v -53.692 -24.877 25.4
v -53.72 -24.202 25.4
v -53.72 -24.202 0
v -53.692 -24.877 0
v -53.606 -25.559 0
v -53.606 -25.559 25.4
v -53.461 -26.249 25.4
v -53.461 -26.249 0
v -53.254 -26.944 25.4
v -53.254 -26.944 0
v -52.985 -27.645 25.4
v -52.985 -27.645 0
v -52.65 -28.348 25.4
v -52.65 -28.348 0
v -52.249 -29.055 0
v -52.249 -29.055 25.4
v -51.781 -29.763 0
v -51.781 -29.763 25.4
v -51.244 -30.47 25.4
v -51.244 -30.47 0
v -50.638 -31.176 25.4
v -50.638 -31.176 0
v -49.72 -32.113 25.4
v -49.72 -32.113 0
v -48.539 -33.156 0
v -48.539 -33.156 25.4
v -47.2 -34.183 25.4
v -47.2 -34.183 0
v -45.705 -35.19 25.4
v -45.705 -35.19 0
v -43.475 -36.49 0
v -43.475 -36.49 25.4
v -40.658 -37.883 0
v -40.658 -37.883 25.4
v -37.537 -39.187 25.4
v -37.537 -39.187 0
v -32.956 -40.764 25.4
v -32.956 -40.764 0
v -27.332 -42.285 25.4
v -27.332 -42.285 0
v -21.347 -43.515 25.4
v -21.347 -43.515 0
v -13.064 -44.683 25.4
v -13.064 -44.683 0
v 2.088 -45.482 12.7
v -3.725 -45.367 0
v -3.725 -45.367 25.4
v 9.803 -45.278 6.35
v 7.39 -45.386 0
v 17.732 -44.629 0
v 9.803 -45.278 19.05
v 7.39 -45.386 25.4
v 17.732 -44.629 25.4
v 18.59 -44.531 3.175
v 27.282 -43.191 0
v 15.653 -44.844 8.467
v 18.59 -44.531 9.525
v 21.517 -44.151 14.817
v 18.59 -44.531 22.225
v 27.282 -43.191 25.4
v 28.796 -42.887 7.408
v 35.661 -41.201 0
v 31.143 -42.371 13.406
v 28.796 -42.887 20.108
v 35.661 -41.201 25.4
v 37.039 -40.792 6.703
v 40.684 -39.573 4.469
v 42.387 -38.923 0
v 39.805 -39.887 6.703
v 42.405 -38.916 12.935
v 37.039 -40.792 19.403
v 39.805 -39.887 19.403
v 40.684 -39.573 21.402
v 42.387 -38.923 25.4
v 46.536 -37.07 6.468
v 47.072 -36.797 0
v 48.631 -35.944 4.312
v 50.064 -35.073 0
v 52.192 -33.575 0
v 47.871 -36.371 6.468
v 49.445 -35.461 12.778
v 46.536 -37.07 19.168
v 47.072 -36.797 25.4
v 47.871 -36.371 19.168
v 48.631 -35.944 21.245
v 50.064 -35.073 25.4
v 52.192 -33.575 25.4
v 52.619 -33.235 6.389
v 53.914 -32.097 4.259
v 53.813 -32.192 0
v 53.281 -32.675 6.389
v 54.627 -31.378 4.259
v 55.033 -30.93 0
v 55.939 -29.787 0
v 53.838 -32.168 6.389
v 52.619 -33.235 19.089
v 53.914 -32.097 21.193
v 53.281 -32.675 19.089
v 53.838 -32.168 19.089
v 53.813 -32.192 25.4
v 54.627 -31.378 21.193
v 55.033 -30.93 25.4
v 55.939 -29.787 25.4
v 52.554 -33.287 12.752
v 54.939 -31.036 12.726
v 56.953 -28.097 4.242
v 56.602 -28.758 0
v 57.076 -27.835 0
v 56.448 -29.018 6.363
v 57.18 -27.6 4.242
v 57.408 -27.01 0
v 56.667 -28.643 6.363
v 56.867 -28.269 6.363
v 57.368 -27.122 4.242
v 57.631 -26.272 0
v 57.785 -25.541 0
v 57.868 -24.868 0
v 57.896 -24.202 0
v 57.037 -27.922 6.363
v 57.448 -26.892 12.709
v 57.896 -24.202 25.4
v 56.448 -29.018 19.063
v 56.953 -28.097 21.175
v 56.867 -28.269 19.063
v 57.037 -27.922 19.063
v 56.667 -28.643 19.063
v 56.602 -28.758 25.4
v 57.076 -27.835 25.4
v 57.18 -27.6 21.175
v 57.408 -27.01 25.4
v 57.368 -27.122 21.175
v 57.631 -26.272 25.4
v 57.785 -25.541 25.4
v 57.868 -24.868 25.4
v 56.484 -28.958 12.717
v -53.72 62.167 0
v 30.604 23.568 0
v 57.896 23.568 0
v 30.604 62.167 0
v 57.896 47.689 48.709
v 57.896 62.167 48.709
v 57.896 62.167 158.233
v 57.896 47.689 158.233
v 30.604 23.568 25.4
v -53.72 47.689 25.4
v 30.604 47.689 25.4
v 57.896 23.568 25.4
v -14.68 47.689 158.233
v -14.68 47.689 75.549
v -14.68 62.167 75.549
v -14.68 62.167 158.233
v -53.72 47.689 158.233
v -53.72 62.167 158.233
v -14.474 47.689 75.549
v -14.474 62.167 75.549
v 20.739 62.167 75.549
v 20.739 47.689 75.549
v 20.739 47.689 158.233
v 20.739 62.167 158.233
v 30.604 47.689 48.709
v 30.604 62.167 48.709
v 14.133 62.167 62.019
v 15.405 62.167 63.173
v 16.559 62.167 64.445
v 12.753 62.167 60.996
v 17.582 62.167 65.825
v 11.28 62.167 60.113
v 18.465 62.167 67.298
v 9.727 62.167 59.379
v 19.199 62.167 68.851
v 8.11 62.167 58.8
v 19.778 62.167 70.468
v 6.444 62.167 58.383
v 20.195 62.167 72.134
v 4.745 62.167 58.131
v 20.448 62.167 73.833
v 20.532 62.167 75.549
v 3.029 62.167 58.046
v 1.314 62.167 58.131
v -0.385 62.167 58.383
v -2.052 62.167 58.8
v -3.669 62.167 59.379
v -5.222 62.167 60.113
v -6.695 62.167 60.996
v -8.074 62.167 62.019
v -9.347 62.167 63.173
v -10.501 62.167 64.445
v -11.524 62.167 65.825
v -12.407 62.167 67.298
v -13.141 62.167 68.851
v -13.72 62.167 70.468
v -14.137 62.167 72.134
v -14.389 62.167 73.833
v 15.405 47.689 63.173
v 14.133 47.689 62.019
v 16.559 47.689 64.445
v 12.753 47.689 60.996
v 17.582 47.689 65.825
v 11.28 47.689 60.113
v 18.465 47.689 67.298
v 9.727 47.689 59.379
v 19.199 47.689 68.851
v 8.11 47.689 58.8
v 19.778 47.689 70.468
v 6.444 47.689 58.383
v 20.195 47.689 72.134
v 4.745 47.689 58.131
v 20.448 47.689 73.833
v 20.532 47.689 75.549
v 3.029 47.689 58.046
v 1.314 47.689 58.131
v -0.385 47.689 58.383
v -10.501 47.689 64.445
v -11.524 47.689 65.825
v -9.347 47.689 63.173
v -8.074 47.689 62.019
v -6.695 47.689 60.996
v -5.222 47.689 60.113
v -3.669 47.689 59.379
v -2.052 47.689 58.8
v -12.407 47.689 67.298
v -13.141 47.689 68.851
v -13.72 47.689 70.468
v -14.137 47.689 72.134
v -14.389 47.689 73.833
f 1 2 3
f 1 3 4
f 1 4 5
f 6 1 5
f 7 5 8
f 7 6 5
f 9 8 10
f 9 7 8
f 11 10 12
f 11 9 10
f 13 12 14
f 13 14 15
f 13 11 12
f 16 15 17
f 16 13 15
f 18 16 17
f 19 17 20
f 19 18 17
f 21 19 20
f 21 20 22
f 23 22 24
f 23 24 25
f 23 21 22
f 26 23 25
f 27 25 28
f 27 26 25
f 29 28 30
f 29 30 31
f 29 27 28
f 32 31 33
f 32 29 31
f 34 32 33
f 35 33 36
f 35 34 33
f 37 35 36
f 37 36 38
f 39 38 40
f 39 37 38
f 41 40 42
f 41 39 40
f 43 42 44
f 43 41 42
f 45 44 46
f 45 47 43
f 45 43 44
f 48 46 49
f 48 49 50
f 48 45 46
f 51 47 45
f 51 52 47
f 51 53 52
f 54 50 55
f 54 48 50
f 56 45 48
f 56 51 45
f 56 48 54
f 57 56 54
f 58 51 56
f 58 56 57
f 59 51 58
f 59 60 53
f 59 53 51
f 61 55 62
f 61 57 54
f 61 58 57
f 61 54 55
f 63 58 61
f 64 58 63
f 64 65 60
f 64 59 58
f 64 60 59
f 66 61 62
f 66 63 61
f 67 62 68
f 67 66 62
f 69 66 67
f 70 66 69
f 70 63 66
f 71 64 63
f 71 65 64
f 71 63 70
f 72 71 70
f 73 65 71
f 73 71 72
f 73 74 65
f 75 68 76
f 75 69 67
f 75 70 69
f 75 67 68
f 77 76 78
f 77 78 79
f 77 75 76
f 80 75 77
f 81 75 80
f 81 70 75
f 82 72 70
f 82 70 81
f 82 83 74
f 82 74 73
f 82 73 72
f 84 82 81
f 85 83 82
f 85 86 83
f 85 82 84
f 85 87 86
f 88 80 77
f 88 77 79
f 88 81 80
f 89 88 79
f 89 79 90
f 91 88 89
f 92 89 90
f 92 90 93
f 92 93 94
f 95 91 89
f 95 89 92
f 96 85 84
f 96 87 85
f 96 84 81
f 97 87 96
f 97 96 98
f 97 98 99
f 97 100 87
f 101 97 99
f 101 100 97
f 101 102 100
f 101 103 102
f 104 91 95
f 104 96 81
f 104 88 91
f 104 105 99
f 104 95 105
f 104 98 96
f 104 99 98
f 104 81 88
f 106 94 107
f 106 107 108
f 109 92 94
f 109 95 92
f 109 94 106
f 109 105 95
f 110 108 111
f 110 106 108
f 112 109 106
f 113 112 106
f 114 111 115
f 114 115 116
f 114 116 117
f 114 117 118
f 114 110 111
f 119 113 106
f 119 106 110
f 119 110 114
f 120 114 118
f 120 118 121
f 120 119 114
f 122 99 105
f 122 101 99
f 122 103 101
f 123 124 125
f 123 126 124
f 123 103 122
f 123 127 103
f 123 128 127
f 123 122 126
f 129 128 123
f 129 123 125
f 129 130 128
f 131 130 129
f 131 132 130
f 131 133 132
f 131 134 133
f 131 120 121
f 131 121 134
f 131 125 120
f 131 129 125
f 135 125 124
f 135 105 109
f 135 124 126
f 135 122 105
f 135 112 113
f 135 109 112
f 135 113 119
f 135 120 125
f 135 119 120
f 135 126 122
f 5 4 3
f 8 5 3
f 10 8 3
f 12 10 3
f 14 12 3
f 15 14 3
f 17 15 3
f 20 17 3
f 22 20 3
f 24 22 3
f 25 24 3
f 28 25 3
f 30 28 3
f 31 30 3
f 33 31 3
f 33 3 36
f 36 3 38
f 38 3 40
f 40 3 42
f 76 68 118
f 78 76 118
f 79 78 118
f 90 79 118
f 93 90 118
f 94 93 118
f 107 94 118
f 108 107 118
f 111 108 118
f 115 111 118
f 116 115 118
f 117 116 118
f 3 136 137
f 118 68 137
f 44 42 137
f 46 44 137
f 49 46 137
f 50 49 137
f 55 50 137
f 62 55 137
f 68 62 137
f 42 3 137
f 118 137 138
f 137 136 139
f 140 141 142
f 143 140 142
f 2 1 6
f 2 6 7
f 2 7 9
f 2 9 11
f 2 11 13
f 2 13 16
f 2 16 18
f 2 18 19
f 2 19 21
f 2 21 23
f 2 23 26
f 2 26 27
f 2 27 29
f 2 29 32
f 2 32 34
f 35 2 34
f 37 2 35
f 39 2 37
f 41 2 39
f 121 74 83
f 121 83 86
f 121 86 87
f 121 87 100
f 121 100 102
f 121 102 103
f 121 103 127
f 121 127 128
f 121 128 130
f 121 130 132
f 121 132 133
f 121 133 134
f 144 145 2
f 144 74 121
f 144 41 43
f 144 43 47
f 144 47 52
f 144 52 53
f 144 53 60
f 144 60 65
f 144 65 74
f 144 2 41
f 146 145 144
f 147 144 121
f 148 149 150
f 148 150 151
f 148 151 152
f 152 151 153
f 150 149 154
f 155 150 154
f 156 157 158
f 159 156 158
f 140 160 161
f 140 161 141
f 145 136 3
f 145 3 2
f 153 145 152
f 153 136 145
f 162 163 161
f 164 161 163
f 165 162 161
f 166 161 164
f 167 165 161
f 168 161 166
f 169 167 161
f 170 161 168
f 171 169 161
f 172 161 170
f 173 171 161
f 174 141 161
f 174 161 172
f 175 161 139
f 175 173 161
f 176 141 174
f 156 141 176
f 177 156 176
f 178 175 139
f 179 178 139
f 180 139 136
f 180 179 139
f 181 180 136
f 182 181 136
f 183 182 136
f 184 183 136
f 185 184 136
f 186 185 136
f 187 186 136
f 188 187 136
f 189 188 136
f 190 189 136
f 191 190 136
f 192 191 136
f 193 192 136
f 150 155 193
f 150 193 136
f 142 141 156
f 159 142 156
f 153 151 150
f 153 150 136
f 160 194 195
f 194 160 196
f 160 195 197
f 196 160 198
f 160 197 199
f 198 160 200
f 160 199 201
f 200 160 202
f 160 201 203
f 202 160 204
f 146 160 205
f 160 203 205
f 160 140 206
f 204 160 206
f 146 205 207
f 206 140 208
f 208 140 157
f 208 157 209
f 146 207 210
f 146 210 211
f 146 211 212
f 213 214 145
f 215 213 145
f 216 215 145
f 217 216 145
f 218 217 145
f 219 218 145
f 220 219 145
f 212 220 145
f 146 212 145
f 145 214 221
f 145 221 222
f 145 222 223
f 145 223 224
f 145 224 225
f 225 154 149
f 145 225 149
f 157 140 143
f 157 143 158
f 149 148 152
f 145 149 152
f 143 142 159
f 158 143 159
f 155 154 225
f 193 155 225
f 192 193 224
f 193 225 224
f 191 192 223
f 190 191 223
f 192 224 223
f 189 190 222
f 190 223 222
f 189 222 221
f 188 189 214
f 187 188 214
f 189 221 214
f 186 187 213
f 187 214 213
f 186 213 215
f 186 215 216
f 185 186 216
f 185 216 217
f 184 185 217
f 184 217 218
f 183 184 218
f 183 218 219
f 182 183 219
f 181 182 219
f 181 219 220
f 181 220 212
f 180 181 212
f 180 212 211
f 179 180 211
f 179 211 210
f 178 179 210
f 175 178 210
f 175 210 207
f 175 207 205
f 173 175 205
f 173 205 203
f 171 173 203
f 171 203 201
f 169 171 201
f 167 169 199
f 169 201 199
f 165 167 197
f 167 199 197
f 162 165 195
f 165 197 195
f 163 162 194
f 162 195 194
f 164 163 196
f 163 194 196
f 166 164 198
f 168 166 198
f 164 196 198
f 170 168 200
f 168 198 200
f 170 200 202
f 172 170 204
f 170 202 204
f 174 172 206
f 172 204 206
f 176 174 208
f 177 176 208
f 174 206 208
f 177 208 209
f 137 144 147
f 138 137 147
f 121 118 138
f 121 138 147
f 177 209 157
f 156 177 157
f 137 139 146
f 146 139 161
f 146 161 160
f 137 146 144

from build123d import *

# Parameters (mm, degrees)
F0_W      = 111.6153746843
F0_H      = 86.3690413535
F1_DEPTH  = 25.4
F2_W      = 111.6153746843
F2_H      = 132.8332849503
F3_DEPTH  = 14.478
F5_DEPTH  = 25.4
F6_W      = 27.2912848741
F6_H      = 24.1202692242
F6_H_2    = 22.7464084773
F7_DEPTH  = 56.134
F8_W      = 27.2912848741
F8_H      = 23.3086437643
F9_DEPTH  = 25.4
F10_W     = 35.4191940278
F10_H     = 82.6842561364
F11_DEPTH = 25.4
F13_DEPTH = 25.4


with BuildPart() as f1:
    # F0 (on Top) → F1 (new body)
    with BuildSketch(Plane.XY):
        with Locations((2.0880438387, 18.9822074026)):
            Rectangle(F0_W, F0_H)
    extrude(amount=F1_DEPTH)

    # F2 (on face) → F3 (join)
    with BuildSketch(Plane(origin=(0, 62.1667280793, 0), x_dir=(-1, 0, 0), z_dir=(0, 1, 0))):
        with Locations((-2.0880438387, 91.8166424751)):
            Rectangle(F2_W, F2_H)
    extrude(amount=-F3_DEPTH)

    # F4 (on face) → F5 (join)
    with BuildSketch(Plane.XY.offset(25.4)):
        with BuildLine():
            add(Edge.make_bspline(
                [(-53.7196435034, -24.2023132741), (-53.7196435034, -45.4823012569), (2.0880438387, -45.4823012569), (57.8957311809, -45.4823012569), (57.8957311809, -24.2023132741)],
                knots=[3.1415926536, 3.1415926536, 3.1415926536, 4.7123889804, 4.7123889804, 6.2831853072, 6.2831853072, 6.2831853072], degree=2, weights=[1, 0.7071067812, 1, 0.7071067812, 1]))
            Line((57.8957311809, -24.2023132741), (-53.7196435034, -24.2023132741))
        make_face()
    extrude(amount=-F5_DEPTH)

    # F6 (on face) → F7 (cut)
    with BuildSketch(Plane.XY.offset(25.4)):
        with Locations((44.2500887439, 35.6285934672)):
            Rectangle(F6_W, F6_H)
        with Locations((44.2500887439, 59.061932318)):
            Rectangle(F6_W, F6_H_2)
    extrude(amount=-F7_DEPTH, mode=Mode.SUBTRACT)

    # F8 (on face) → F9 (cut)
    with BuildSketch(Plane.XZ.offset(-47.6887280793)):
        with Locations((44.2500887439, 37.0543218821)):
            Rectangle(F8_W, F8_H)
    extrude(amount=-F9_DEPTH, mode=Mode.SUBTRACT)

    # F10 (on face) → F11 (cut)
    with BuildSketch(Plane.XZ.offset(-47.6887280793)):
        with Locations((3.0291331932, 116.891156882)):
            Rectangle(F10_W, F10_H)
    extrude(amount=-F11_DEPTH, mode=Mode.SUBTRACT)

    # F12 (on face) → F13 (cut)
    with BuildSketch(Plane.XZ.offset(-47.6887280793)):
        with BuildLine():
            ThreePointArc((-14.4735330019, 75.5490288138), (3.0291331932, 58.0463626187), (20.5317993883, 75.5490288138))
            Line((20.5317993883, 75.5490288138), (-14.4735330019, 75.5490288138))
        make_face()
    extrude(amount=-F13_DEPTH, mode=Mode.SUBTRACT)


solid = f1.part
